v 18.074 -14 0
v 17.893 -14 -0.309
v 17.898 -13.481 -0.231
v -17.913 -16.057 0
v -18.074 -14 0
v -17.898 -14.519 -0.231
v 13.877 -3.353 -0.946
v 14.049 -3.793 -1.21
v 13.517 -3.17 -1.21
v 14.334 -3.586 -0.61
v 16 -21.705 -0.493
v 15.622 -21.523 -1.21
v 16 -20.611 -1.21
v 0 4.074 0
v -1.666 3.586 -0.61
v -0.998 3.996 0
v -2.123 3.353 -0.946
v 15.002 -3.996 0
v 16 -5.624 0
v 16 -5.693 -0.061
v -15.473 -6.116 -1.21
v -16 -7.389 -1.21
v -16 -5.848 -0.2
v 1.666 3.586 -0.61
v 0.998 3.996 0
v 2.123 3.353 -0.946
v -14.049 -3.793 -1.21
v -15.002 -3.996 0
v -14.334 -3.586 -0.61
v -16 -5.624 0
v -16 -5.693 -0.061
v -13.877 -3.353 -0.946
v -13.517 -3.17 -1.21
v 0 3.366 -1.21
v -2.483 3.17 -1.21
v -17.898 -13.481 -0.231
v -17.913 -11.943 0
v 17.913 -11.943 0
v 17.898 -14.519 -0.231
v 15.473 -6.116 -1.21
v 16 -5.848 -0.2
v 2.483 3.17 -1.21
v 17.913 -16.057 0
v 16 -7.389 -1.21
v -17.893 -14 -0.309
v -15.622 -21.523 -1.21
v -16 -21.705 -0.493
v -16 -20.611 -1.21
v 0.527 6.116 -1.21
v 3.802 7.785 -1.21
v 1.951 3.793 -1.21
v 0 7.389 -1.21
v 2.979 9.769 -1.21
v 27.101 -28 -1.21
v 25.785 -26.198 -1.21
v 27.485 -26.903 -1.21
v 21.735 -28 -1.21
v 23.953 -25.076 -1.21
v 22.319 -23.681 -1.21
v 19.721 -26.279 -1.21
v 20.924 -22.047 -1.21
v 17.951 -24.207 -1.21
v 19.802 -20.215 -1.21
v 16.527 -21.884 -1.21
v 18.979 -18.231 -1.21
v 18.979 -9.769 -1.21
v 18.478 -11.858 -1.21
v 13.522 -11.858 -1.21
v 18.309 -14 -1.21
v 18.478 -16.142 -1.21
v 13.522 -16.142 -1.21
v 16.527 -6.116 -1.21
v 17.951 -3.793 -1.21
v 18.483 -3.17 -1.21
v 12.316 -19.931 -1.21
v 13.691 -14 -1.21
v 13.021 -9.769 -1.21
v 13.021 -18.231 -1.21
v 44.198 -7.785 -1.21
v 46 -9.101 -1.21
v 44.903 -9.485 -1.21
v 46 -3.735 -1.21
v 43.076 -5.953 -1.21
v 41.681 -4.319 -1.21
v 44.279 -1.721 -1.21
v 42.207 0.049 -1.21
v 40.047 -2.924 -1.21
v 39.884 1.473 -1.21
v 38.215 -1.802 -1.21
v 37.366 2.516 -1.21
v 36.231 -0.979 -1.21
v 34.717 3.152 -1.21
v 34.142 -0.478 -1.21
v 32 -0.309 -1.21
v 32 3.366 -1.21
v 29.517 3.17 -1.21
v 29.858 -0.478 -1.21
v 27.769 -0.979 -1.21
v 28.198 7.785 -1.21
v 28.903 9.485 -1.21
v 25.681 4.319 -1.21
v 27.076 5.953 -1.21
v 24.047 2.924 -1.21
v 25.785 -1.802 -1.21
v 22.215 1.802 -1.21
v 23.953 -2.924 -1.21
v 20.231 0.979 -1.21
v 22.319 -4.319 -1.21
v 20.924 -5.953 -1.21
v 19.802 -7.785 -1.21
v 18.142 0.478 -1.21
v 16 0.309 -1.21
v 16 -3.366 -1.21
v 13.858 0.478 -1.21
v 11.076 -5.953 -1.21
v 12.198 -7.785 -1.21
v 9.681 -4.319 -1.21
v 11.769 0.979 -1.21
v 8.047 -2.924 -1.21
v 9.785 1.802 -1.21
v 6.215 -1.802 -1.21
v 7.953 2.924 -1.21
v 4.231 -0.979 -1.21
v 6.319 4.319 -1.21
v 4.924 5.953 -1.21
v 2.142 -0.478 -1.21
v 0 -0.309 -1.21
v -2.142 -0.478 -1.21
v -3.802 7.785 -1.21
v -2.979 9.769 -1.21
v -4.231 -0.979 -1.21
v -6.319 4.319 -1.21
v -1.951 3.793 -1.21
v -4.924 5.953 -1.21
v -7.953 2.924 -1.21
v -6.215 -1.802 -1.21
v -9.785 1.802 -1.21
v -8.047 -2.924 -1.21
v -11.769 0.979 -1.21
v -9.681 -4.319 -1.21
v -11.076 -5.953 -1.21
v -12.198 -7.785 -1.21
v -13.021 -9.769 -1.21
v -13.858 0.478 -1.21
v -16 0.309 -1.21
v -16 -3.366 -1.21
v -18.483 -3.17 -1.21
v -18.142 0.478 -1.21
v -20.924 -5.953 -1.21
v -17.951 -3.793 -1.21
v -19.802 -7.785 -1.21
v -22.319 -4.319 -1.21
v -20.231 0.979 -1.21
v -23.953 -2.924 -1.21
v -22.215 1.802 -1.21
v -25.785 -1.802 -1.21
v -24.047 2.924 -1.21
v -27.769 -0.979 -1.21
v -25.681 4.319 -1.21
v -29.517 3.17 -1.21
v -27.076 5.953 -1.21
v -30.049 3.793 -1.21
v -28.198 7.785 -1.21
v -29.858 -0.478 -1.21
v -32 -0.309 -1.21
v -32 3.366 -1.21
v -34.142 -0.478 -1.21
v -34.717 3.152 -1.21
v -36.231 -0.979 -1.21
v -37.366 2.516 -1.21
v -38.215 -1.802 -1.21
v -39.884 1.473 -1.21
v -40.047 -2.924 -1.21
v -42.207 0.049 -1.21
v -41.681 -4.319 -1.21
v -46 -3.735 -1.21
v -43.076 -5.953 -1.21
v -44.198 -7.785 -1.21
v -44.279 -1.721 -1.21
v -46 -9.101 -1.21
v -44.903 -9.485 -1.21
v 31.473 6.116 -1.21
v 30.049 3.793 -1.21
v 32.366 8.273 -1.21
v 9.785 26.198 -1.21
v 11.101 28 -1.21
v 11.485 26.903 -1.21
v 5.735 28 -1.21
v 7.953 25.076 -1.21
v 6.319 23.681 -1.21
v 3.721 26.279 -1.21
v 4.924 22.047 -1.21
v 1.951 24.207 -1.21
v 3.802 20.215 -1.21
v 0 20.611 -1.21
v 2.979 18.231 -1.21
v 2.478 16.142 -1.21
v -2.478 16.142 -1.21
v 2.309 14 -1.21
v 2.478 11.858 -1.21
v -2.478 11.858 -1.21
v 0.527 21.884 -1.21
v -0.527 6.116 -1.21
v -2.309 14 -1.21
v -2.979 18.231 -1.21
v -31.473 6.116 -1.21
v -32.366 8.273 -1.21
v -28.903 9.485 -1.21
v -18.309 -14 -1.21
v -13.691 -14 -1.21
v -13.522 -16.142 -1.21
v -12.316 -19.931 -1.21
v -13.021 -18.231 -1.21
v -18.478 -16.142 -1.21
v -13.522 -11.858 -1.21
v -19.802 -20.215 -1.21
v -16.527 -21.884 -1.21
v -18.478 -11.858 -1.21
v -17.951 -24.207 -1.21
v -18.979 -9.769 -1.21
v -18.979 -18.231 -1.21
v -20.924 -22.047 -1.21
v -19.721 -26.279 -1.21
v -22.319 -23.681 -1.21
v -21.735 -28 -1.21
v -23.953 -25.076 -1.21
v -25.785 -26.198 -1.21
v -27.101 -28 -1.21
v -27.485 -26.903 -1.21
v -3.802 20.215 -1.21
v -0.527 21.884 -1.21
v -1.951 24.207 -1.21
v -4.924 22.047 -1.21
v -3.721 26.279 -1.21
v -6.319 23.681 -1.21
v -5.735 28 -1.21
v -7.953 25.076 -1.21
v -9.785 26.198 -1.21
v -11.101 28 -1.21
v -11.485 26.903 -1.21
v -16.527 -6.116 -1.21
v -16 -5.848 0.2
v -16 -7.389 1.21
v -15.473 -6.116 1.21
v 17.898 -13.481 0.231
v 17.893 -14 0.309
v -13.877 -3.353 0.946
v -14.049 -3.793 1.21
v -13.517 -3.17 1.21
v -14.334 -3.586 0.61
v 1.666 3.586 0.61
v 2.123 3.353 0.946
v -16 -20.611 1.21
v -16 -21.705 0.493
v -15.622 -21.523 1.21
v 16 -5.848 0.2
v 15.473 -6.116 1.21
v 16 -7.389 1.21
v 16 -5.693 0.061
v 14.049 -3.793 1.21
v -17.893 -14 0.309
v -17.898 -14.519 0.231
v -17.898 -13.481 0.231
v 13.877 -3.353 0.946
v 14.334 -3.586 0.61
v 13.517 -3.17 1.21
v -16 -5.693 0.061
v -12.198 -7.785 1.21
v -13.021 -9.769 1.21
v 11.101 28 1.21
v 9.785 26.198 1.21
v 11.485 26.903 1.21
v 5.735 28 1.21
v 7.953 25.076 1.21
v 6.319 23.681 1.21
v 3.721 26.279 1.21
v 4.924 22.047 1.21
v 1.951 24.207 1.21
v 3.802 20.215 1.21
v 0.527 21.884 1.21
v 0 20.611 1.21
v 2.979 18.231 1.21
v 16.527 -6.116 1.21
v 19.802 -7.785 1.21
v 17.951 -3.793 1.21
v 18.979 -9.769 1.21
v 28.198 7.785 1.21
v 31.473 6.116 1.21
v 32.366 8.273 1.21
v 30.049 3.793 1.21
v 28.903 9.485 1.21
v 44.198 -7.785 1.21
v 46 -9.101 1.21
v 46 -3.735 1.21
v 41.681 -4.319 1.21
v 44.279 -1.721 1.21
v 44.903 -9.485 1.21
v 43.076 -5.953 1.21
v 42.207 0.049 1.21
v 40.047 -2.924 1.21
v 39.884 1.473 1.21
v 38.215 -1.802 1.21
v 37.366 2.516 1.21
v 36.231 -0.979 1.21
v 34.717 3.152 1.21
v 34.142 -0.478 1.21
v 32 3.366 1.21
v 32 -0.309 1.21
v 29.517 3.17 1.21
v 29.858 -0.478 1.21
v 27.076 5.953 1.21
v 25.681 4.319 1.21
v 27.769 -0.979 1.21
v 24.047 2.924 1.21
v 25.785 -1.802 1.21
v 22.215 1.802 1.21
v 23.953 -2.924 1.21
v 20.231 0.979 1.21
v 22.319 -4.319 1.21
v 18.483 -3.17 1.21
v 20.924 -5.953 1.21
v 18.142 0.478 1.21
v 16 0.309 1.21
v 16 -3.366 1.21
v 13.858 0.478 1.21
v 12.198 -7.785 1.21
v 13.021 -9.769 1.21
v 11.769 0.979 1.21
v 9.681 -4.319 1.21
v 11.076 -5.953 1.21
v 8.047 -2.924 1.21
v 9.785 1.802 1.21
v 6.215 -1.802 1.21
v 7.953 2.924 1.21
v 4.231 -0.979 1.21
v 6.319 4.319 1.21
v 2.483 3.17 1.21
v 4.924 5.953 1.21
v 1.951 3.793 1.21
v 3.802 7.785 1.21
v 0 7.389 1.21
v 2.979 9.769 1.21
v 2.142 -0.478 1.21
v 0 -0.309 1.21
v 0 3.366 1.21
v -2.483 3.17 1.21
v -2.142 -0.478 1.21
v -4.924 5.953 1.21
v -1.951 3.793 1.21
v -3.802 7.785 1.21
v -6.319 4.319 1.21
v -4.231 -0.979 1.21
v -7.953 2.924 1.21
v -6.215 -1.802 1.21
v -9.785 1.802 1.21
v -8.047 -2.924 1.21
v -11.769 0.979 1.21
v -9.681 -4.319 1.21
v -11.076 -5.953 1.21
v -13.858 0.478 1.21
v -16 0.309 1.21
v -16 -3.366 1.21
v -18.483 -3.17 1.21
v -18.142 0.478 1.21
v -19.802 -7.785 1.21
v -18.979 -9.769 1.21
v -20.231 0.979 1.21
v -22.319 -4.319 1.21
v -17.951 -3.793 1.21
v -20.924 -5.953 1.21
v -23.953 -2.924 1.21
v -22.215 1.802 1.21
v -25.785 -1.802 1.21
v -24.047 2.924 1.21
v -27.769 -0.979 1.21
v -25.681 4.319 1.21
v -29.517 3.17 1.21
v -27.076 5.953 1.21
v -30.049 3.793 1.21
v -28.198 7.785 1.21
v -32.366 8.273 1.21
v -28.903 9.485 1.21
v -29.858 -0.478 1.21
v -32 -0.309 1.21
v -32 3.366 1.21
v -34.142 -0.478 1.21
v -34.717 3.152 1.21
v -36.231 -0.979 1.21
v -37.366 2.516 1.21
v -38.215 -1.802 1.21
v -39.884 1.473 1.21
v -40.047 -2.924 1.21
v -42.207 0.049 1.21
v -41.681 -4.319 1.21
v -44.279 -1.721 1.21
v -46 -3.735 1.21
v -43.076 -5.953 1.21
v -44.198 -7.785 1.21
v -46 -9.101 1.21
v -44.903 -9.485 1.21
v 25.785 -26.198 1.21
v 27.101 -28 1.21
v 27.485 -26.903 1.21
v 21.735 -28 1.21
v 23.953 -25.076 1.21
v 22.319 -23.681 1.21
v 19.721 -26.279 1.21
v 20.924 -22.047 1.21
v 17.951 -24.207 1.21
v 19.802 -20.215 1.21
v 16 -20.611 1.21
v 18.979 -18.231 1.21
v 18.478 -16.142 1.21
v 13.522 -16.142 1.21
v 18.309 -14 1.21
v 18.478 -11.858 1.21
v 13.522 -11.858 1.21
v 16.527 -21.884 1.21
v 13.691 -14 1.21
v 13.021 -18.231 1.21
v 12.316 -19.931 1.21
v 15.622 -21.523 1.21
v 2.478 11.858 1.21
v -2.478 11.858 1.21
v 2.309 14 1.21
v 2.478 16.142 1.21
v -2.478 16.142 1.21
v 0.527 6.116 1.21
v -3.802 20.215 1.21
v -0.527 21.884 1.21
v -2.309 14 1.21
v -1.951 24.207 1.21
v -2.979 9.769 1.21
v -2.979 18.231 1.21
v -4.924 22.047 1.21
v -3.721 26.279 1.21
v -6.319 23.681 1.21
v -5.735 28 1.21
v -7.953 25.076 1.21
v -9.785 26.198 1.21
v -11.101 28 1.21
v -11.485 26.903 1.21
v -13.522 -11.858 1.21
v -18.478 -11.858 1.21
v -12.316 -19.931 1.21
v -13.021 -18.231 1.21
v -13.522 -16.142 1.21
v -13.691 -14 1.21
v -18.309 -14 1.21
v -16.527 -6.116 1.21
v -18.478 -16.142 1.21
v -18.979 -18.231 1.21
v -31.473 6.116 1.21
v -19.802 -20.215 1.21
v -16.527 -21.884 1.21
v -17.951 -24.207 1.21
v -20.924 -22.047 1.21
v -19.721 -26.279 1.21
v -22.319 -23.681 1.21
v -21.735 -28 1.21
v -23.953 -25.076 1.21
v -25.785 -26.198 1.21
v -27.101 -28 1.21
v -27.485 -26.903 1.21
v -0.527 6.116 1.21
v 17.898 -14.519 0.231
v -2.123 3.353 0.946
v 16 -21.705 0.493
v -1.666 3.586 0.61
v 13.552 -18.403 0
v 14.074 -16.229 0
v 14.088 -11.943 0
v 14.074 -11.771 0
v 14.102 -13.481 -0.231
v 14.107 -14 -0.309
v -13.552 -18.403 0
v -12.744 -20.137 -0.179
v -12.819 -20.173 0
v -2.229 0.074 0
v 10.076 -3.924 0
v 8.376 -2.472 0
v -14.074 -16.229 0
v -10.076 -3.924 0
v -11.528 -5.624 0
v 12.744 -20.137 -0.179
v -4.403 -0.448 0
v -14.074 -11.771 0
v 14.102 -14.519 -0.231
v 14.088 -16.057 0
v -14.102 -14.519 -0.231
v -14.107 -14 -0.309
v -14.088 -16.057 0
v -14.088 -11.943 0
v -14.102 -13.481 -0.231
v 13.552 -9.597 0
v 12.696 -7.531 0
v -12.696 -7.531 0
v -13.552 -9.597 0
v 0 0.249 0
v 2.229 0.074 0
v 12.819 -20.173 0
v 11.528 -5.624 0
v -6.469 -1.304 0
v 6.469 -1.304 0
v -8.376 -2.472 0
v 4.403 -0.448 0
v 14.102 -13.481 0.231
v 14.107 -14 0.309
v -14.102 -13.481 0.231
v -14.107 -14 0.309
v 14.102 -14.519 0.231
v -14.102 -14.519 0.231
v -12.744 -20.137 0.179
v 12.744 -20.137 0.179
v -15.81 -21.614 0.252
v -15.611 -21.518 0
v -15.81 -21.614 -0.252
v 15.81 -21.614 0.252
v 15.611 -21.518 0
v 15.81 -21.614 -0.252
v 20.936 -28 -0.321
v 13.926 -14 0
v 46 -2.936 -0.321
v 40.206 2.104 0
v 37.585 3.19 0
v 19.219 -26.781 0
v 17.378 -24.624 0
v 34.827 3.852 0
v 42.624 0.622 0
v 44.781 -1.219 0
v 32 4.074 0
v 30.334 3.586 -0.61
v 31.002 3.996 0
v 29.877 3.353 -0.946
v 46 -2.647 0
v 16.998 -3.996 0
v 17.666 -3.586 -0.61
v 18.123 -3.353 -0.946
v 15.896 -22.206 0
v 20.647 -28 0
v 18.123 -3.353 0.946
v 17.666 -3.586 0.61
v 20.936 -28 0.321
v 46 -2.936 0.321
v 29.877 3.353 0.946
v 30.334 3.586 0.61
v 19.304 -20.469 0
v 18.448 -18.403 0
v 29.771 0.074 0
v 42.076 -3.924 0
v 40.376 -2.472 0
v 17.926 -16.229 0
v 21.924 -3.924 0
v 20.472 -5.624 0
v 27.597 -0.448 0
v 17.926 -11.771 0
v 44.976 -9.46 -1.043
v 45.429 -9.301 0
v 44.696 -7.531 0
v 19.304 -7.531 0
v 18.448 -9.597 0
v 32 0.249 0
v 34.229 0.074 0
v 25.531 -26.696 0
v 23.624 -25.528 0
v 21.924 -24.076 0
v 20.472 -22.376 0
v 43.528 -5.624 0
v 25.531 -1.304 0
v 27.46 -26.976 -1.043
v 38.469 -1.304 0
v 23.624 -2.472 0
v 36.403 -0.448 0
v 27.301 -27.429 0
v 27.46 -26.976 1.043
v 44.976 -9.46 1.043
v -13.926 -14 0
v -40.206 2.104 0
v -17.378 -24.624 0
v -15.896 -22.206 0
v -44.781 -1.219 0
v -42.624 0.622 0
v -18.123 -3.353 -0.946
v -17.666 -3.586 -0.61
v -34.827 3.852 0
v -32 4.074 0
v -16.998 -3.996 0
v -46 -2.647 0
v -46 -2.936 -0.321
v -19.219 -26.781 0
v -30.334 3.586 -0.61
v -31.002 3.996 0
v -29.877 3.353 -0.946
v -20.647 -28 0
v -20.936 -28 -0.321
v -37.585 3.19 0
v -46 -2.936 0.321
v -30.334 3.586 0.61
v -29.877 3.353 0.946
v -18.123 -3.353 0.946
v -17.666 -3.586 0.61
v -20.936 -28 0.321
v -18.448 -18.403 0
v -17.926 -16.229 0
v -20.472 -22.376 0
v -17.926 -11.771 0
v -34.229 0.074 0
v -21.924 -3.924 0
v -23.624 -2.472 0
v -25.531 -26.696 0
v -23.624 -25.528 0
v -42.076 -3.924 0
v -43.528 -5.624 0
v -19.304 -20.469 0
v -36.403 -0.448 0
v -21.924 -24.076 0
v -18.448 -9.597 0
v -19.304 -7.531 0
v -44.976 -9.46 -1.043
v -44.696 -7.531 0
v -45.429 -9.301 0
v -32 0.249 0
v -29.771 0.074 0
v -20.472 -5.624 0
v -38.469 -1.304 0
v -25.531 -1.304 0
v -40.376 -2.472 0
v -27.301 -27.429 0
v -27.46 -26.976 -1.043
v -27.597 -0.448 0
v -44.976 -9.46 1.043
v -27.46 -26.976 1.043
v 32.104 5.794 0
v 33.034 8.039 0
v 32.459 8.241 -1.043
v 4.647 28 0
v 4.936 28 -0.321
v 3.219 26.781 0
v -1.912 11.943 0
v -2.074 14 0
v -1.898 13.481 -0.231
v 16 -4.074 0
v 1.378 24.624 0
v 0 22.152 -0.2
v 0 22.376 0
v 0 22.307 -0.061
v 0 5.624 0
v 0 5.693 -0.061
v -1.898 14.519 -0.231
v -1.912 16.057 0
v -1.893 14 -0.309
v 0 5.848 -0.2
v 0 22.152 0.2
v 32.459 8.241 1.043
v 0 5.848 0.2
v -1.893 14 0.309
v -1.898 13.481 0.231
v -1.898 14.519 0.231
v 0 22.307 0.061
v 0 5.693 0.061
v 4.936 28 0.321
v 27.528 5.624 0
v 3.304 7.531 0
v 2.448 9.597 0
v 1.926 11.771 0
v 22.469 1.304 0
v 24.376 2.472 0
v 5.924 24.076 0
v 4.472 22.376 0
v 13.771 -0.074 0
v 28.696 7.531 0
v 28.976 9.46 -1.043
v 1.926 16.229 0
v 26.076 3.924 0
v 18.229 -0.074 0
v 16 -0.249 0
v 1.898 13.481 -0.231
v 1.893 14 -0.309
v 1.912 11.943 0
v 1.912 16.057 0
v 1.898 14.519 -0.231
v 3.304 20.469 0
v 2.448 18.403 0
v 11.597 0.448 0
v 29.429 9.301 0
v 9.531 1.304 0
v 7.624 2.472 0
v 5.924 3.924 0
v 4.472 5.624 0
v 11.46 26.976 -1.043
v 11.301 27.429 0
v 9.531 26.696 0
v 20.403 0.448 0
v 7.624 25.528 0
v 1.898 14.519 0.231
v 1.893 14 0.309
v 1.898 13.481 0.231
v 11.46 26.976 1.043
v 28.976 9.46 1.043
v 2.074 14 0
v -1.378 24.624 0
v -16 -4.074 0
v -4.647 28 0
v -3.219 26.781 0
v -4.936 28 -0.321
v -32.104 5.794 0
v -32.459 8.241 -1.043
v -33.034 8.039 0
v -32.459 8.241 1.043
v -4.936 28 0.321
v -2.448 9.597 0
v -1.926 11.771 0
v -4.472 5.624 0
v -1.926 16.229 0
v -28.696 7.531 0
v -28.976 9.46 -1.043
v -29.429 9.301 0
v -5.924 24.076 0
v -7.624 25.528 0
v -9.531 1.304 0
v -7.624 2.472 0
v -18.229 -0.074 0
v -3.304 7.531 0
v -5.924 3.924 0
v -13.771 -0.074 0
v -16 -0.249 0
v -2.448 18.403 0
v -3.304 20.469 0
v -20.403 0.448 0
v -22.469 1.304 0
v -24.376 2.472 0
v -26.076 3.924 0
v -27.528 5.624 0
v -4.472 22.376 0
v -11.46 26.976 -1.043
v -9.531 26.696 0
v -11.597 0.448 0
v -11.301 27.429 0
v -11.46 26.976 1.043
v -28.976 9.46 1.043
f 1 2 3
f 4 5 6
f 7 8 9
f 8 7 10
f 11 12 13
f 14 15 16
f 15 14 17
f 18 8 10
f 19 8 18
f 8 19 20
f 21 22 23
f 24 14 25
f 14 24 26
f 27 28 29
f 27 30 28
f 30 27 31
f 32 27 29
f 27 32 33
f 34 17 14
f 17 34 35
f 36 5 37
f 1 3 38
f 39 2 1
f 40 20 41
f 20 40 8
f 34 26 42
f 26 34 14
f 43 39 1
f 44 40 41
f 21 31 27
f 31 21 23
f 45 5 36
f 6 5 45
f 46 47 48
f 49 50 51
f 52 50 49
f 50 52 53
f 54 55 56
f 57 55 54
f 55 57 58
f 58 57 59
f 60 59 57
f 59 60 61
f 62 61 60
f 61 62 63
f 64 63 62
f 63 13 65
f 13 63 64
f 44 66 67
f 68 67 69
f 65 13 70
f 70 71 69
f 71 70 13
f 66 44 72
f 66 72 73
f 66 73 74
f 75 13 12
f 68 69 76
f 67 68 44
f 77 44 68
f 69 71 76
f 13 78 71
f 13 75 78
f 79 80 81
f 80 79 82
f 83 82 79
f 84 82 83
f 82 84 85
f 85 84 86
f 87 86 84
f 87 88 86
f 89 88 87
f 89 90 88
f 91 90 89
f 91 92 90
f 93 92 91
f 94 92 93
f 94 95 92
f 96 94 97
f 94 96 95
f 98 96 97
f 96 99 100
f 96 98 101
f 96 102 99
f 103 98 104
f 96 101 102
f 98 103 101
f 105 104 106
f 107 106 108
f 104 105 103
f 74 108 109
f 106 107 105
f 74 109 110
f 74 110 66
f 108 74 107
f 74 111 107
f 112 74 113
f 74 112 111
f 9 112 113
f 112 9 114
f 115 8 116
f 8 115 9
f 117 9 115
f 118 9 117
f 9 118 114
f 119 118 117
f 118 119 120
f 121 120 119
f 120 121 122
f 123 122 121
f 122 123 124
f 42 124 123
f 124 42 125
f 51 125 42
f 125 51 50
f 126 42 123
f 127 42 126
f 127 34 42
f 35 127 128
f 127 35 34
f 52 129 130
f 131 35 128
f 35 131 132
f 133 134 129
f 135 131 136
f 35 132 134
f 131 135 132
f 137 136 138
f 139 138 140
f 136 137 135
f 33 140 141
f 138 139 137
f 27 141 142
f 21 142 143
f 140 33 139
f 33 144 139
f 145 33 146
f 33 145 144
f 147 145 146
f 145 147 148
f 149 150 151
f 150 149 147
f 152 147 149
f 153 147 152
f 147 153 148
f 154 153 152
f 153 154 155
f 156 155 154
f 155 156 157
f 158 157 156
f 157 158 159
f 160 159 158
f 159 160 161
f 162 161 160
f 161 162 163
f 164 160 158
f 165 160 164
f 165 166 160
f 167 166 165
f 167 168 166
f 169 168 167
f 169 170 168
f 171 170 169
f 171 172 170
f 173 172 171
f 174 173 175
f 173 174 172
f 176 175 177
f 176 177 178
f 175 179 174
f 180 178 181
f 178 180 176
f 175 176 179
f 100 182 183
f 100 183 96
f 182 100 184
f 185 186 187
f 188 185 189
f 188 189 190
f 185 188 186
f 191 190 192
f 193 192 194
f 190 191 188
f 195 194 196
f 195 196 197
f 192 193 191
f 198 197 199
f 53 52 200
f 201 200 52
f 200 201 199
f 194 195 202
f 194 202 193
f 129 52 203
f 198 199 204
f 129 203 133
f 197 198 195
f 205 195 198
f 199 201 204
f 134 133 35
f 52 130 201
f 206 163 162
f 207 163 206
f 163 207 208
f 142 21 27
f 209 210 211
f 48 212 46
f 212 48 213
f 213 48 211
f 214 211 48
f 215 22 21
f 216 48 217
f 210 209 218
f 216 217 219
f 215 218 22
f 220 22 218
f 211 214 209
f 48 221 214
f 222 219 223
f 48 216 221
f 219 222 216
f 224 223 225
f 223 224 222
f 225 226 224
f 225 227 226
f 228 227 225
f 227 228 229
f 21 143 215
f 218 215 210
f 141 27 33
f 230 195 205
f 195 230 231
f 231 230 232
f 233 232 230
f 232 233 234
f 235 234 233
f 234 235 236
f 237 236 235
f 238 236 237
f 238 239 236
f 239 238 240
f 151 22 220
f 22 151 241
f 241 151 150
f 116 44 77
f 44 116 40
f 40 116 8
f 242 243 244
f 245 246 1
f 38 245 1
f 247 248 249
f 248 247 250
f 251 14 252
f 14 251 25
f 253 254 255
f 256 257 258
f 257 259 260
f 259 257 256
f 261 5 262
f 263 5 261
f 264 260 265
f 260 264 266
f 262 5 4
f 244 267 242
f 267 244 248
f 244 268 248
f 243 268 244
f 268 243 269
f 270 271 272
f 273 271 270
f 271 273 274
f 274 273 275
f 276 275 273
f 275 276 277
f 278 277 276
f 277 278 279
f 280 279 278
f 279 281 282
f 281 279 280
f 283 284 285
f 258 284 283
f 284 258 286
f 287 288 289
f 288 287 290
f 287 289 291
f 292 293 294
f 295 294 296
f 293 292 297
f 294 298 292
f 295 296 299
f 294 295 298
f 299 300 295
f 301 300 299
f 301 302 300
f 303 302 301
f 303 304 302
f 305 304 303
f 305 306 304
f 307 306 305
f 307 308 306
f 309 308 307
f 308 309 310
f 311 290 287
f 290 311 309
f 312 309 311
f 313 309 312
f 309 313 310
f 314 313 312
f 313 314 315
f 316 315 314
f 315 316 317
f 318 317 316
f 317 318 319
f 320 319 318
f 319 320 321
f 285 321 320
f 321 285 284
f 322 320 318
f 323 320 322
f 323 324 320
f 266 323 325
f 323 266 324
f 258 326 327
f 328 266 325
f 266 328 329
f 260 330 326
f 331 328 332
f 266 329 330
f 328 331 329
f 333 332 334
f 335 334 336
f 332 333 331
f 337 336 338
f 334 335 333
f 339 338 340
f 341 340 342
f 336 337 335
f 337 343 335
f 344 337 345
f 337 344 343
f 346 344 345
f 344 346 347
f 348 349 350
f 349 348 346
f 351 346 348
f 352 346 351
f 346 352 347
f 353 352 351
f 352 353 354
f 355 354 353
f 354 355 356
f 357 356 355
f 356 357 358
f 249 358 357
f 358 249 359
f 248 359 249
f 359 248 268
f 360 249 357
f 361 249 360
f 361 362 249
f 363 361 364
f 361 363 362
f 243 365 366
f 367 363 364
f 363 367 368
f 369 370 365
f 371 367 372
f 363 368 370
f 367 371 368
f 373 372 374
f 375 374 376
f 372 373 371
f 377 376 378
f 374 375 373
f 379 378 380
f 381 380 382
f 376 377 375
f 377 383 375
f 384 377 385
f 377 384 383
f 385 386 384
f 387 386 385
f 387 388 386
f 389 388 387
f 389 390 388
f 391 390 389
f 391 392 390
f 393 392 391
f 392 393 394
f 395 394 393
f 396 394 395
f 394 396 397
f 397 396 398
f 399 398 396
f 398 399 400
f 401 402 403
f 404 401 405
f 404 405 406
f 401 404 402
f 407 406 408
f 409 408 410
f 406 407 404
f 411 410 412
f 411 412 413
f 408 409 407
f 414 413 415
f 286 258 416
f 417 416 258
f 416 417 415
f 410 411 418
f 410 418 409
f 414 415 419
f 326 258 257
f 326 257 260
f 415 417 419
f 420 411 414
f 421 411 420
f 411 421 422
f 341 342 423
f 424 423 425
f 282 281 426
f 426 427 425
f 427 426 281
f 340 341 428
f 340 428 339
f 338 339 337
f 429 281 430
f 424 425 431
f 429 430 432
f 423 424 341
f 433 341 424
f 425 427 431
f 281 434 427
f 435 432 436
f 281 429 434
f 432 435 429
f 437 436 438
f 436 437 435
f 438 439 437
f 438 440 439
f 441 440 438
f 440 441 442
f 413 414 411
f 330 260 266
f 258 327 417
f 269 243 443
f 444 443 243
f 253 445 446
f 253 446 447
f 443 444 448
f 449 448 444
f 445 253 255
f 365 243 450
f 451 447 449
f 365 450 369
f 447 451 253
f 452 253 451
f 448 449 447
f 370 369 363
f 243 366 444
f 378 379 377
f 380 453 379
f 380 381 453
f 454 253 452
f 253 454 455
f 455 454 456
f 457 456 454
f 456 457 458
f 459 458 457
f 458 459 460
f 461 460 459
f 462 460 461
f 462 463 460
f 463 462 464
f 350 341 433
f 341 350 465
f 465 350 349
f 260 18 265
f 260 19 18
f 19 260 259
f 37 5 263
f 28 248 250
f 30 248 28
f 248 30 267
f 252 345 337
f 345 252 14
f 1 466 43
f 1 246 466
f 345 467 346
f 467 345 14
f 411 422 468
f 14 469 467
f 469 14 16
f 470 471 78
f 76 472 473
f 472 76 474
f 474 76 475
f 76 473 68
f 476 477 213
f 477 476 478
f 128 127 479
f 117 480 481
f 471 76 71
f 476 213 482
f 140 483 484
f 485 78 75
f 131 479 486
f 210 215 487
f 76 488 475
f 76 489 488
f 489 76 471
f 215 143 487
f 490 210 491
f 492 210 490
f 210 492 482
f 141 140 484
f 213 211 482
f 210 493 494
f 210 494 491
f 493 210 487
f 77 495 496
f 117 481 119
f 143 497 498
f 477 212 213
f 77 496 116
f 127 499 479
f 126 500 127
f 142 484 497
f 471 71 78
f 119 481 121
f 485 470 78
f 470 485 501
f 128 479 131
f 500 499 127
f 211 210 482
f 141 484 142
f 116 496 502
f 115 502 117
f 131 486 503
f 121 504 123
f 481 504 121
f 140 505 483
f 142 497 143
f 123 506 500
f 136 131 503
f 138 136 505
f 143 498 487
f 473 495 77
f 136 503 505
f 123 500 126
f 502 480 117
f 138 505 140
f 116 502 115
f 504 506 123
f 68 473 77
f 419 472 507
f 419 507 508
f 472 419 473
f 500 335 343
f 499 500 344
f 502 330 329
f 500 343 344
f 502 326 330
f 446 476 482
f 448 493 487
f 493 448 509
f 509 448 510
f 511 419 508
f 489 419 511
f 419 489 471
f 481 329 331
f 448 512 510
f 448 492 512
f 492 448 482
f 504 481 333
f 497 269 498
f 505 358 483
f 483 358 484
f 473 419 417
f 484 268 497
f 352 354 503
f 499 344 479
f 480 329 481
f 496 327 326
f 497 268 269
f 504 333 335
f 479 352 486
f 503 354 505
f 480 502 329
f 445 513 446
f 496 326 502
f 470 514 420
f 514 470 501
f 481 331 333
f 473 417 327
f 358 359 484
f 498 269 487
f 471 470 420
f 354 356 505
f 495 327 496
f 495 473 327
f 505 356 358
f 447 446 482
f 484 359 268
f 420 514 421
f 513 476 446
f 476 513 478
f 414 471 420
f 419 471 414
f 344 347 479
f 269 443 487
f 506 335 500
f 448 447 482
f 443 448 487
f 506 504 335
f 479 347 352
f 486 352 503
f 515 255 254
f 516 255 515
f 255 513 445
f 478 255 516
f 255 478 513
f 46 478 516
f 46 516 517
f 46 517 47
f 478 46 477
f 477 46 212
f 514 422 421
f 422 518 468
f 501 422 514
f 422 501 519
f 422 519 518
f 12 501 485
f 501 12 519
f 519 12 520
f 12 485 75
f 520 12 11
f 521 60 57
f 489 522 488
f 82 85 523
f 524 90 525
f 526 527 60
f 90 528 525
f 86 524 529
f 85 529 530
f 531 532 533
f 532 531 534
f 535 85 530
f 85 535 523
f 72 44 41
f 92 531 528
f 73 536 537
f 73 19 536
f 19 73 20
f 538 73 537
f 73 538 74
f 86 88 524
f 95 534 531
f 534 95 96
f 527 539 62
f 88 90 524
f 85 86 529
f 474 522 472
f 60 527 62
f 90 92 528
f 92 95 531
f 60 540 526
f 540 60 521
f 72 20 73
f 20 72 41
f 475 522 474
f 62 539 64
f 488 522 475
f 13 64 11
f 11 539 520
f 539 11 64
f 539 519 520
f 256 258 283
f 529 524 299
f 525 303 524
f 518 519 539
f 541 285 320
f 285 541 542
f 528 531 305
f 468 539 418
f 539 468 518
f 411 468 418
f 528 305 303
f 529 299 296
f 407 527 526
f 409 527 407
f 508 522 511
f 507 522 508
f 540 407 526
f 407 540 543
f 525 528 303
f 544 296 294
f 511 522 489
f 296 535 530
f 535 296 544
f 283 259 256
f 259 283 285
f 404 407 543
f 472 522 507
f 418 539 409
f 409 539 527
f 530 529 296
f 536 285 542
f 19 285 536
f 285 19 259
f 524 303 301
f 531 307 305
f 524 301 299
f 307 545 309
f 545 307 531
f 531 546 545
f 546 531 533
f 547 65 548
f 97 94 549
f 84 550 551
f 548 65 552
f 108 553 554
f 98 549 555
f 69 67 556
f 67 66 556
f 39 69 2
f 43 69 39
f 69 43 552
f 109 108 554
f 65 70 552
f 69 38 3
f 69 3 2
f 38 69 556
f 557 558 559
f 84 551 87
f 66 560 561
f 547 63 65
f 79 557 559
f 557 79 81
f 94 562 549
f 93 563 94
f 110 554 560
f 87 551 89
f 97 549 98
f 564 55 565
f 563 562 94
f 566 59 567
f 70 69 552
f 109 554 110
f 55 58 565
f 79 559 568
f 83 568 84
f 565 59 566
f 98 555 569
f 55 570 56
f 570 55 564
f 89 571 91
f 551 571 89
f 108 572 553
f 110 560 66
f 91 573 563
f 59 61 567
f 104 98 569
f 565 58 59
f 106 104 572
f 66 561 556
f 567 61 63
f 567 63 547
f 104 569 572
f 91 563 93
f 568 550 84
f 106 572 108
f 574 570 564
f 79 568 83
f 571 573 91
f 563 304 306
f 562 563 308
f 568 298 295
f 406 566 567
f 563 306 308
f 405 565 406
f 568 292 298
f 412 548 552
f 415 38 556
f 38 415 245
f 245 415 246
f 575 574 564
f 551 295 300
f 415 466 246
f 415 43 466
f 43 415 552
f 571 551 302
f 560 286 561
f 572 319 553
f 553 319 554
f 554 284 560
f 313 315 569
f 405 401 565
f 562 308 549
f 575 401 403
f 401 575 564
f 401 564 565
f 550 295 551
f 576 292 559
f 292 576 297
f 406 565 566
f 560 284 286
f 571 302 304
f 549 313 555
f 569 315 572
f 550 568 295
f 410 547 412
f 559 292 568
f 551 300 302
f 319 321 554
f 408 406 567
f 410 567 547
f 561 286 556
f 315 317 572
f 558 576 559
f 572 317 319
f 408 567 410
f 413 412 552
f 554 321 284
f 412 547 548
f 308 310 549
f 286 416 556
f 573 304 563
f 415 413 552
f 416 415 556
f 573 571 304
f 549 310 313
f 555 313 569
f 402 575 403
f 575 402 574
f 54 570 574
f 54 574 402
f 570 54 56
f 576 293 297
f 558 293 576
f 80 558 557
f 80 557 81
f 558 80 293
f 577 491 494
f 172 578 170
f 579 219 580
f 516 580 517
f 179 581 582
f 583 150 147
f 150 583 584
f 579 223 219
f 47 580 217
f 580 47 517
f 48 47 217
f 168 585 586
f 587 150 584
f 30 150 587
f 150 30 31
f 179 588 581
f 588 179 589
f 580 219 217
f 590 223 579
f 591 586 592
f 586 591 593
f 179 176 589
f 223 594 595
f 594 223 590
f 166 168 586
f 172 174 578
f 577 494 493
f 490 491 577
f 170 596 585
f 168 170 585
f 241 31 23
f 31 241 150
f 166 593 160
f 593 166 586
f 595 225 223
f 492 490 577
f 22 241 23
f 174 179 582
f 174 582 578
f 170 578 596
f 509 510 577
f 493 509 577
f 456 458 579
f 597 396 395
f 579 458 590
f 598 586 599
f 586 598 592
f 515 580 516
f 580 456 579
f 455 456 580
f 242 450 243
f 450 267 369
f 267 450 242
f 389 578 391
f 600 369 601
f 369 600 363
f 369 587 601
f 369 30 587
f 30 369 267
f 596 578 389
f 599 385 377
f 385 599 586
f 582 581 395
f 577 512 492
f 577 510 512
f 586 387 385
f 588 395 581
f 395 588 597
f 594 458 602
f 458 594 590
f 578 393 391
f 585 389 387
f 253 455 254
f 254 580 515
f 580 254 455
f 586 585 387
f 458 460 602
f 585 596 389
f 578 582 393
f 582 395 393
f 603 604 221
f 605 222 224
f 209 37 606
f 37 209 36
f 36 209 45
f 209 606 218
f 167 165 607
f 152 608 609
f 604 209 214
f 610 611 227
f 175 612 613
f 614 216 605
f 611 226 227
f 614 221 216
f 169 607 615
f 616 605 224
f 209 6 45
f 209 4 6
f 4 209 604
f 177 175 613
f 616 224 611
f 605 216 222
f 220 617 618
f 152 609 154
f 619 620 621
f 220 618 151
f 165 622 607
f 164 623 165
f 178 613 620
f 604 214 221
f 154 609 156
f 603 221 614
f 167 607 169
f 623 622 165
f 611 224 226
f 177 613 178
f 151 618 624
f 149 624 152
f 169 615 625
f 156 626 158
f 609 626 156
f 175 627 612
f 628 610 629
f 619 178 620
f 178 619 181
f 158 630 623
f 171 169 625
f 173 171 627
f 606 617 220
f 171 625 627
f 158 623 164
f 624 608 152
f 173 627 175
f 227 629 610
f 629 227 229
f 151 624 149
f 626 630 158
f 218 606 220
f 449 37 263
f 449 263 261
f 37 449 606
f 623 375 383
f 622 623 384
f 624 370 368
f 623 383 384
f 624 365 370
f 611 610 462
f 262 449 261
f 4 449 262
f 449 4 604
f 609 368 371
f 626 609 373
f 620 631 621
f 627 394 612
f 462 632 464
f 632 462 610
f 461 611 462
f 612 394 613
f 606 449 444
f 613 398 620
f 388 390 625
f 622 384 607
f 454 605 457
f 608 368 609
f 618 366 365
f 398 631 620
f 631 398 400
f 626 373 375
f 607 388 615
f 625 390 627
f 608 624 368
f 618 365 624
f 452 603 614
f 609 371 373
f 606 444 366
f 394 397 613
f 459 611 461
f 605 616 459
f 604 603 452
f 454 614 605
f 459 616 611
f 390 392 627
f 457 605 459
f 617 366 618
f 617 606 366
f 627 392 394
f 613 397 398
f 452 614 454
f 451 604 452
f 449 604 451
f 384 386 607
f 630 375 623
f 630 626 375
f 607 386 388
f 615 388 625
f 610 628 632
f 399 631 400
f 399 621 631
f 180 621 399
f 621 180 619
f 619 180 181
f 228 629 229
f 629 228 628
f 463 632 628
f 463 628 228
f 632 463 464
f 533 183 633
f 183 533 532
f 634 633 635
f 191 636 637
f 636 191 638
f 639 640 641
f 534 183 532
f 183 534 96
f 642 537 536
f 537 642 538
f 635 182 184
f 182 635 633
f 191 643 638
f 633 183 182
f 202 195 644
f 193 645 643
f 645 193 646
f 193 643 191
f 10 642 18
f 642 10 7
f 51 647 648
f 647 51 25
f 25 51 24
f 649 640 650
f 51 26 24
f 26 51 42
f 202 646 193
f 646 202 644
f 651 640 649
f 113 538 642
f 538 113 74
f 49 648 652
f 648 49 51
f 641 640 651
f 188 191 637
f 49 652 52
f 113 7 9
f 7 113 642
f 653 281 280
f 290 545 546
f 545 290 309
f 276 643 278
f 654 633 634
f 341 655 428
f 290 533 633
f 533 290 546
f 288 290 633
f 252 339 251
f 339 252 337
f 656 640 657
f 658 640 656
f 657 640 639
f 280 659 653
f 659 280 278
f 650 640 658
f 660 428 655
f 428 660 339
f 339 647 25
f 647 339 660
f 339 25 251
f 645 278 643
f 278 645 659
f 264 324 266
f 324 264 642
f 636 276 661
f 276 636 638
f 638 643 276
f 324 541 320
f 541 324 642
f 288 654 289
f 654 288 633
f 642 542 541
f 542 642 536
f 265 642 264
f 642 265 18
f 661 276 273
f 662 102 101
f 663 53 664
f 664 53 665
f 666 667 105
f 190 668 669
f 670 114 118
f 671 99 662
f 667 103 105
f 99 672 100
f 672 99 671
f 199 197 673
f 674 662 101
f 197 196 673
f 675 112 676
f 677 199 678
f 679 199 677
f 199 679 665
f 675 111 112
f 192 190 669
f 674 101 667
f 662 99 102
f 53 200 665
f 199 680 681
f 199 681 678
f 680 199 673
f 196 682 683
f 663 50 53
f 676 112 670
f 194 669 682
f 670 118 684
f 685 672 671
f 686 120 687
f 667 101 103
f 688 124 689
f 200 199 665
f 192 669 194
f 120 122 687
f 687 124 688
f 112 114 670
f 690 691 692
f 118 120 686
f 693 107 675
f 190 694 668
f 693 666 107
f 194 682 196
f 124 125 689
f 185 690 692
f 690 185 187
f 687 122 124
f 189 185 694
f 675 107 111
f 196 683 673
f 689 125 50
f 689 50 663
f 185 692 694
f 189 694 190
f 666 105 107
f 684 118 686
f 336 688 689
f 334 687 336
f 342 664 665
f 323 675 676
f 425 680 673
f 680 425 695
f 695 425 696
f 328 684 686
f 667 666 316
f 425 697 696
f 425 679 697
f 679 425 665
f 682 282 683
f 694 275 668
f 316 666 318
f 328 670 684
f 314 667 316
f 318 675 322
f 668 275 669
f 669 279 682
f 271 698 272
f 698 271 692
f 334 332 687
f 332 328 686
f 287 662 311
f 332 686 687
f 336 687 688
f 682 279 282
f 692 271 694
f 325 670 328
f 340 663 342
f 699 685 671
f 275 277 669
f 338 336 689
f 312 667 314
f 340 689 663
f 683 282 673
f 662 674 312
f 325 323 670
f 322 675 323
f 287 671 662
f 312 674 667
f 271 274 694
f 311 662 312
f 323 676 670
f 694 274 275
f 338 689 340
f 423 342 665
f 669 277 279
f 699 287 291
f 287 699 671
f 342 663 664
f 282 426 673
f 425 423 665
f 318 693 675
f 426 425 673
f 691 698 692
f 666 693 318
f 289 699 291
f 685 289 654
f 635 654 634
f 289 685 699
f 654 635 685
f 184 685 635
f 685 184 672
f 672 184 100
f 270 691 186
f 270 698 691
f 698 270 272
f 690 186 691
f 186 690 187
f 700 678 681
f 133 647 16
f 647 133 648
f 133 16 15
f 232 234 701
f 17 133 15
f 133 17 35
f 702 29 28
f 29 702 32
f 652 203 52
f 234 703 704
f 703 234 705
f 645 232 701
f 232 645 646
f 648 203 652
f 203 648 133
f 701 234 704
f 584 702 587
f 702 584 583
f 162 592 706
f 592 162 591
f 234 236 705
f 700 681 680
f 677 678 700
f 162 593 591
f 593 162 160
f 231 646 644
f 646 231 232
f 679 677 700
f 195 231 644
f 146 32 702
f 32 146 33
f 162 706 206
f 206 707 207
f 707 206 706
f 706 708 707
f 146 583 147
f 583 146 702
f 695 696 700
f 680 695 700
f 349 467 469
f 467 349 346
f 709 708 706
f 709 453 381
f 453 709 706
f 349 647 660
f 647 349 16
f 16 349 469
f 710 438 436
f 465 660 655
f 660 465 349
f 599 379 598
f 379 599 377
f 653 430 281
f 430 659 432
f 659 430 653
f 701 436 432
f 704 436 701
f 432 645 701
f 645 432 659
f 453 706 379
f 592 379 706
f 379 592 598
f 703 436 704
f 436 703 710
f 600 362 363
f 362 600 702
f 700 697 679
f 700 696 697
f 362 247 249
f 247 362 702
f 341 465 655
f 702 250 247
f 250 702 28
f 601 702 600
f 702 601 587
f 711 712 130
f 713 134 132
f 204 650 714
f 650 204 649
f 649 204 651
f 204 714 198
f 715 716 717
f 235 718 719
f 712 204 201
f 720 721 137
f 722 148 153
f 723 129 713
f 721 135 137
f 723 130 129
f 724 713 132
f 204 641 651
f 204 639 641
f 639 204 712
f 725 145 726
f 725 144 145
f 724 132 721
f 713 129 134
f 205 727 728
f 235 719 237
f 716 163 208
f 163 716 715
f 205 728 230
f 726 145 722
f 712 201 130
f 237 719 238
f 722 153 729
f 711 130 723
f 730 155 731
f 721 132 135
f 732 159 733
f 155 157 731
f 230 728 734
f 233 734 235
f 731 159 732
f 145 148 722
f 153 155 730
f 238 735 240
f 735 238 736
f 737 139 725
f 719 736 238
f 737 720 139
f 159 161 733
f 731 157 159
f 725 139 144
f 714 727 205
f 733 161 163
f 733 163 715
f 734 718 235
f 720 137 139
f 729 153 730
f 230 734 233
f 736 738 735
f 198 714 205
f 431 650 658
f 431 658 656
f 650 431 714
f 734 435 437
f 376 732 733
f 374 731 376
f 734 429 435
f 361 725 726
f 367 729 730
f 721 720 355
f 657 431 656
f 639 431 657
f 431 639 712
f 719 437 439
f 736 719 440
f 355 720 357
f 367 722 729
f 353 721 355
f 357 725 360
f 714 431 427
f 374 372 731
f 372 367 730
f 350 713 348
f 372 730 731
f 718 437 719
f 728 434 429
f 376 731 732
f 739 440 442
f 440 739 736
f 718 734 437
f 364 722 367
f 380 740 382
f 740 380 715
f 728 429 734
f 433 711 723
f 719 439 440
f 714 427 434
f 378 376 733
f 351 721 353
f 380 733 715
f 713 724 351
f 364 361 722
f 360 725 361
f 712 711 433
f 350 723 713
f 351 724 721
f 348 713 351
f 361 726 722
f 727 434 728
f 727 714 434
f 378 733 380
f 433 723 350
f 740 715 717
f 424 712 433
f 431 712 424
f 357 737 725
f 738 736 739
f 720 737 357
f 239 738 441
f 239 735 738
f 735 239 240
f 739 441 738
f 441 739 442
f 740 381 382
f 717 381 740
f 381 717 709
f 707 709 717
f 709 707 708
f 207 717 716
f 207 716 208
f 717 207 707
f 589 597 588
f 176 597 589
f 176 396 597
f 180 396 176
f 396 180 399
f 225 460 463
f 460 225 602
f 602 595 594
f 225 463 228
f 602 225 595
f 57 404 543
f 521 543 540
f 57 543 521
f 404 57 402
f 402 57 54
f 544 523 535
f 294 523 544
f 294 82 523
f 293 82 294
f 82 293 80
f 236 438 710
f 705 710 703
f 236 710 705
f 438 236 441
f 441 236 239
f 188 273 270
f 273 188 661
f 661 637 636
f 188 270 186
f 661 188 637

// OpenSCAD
Length=92; //Credit Card Size
Width=56; //Credit Card Size
NDia=21.19; //Canadian Nickle Diameter
NThick=1.81; //Canadian Nickle Thickness
DDia=18.01; //Canadian Dime Thickness
DThick=1.19; //Canadian Dime Thickness
QDia=23.88; //Canadian Quarter Thickness
QThick=1.58; //Canadian Quarter Thickness
LDia=26.48; //Canadian Loonie Diameter
LThick=1.92; //Candian Loonie Thickness
TDia=27.94; //Candian Toonie Diameter
TThick=1.67; //Candian Toonie Thickness
WallWidth=3.75; //Hub Thickness for flexibimty and strength
Thickness=LThick+0.5; //0.5mm thicker than thickest coin
$fn=40;


module CoinHole(Diameter){
	translate([0,0,-Thickness/2])cylinder(r1=Diameter*0.49,r2=Diameter*.51,h=Thickness/2);
	translate([0,0,0])cylinder(r1=Diameter*0.51,r2=Diameter*.49,h=Thickness/2);
	cylinder(r=Diameter*.49,h=Thickness*2,center=true);
}
module OutCoinHole(Diameter){
	translate([0,0,-Thickness/2])cylinder(r1=Diameter*0.49,r2=Diameter*.51,h=Thickness/2);
	translate([0,0,0])cylinder(r1=Diameter*0.51,r2=Diameter*.49,h=Thickness/2);
	//cylinder(r=Diameter*.49,h=Thickness*2,center=true);
}
module CutOut(Size){
	translate([-Size,0,-Thickness])cylinder(r=Size,h=Thickness*2,$fn=7,center=false);
}
module CoinCircle(XLoc,YLoc,Diameter,Rot){
	difference(){
		translate([XLoc,YLoc,0])OutCoinHole(Diameter+WallWidth*2); //Outside Circle
		translate([XLoc,YLoc,0])CoinHole(Diameter); //Inside Circle
		translate([XLoc,YLoc,0])rotate(a=[0,0,Rot])CutOut(Diameter); //Stress Notch
	}
}

intersection(){
	union(){
		CoinCircle(0,-14,TDia,90); //Loonie 1
		CoinCircle(32,-14,TDia,135); //Loonie 2
		CoinCircle(-32,-14,TDia,45); //Loonie 3
		CoinCircle(16,14,TDia,-135); //Loonie 4
		CoinCircle(-16,14,TDia,-45); //Loonie 5
	}
	minkowski(){
			cube([Length-4,Width-4,Thickness],center=true);
			cylinder(r=2,h=Thickness/2,center=true);
	}
}
